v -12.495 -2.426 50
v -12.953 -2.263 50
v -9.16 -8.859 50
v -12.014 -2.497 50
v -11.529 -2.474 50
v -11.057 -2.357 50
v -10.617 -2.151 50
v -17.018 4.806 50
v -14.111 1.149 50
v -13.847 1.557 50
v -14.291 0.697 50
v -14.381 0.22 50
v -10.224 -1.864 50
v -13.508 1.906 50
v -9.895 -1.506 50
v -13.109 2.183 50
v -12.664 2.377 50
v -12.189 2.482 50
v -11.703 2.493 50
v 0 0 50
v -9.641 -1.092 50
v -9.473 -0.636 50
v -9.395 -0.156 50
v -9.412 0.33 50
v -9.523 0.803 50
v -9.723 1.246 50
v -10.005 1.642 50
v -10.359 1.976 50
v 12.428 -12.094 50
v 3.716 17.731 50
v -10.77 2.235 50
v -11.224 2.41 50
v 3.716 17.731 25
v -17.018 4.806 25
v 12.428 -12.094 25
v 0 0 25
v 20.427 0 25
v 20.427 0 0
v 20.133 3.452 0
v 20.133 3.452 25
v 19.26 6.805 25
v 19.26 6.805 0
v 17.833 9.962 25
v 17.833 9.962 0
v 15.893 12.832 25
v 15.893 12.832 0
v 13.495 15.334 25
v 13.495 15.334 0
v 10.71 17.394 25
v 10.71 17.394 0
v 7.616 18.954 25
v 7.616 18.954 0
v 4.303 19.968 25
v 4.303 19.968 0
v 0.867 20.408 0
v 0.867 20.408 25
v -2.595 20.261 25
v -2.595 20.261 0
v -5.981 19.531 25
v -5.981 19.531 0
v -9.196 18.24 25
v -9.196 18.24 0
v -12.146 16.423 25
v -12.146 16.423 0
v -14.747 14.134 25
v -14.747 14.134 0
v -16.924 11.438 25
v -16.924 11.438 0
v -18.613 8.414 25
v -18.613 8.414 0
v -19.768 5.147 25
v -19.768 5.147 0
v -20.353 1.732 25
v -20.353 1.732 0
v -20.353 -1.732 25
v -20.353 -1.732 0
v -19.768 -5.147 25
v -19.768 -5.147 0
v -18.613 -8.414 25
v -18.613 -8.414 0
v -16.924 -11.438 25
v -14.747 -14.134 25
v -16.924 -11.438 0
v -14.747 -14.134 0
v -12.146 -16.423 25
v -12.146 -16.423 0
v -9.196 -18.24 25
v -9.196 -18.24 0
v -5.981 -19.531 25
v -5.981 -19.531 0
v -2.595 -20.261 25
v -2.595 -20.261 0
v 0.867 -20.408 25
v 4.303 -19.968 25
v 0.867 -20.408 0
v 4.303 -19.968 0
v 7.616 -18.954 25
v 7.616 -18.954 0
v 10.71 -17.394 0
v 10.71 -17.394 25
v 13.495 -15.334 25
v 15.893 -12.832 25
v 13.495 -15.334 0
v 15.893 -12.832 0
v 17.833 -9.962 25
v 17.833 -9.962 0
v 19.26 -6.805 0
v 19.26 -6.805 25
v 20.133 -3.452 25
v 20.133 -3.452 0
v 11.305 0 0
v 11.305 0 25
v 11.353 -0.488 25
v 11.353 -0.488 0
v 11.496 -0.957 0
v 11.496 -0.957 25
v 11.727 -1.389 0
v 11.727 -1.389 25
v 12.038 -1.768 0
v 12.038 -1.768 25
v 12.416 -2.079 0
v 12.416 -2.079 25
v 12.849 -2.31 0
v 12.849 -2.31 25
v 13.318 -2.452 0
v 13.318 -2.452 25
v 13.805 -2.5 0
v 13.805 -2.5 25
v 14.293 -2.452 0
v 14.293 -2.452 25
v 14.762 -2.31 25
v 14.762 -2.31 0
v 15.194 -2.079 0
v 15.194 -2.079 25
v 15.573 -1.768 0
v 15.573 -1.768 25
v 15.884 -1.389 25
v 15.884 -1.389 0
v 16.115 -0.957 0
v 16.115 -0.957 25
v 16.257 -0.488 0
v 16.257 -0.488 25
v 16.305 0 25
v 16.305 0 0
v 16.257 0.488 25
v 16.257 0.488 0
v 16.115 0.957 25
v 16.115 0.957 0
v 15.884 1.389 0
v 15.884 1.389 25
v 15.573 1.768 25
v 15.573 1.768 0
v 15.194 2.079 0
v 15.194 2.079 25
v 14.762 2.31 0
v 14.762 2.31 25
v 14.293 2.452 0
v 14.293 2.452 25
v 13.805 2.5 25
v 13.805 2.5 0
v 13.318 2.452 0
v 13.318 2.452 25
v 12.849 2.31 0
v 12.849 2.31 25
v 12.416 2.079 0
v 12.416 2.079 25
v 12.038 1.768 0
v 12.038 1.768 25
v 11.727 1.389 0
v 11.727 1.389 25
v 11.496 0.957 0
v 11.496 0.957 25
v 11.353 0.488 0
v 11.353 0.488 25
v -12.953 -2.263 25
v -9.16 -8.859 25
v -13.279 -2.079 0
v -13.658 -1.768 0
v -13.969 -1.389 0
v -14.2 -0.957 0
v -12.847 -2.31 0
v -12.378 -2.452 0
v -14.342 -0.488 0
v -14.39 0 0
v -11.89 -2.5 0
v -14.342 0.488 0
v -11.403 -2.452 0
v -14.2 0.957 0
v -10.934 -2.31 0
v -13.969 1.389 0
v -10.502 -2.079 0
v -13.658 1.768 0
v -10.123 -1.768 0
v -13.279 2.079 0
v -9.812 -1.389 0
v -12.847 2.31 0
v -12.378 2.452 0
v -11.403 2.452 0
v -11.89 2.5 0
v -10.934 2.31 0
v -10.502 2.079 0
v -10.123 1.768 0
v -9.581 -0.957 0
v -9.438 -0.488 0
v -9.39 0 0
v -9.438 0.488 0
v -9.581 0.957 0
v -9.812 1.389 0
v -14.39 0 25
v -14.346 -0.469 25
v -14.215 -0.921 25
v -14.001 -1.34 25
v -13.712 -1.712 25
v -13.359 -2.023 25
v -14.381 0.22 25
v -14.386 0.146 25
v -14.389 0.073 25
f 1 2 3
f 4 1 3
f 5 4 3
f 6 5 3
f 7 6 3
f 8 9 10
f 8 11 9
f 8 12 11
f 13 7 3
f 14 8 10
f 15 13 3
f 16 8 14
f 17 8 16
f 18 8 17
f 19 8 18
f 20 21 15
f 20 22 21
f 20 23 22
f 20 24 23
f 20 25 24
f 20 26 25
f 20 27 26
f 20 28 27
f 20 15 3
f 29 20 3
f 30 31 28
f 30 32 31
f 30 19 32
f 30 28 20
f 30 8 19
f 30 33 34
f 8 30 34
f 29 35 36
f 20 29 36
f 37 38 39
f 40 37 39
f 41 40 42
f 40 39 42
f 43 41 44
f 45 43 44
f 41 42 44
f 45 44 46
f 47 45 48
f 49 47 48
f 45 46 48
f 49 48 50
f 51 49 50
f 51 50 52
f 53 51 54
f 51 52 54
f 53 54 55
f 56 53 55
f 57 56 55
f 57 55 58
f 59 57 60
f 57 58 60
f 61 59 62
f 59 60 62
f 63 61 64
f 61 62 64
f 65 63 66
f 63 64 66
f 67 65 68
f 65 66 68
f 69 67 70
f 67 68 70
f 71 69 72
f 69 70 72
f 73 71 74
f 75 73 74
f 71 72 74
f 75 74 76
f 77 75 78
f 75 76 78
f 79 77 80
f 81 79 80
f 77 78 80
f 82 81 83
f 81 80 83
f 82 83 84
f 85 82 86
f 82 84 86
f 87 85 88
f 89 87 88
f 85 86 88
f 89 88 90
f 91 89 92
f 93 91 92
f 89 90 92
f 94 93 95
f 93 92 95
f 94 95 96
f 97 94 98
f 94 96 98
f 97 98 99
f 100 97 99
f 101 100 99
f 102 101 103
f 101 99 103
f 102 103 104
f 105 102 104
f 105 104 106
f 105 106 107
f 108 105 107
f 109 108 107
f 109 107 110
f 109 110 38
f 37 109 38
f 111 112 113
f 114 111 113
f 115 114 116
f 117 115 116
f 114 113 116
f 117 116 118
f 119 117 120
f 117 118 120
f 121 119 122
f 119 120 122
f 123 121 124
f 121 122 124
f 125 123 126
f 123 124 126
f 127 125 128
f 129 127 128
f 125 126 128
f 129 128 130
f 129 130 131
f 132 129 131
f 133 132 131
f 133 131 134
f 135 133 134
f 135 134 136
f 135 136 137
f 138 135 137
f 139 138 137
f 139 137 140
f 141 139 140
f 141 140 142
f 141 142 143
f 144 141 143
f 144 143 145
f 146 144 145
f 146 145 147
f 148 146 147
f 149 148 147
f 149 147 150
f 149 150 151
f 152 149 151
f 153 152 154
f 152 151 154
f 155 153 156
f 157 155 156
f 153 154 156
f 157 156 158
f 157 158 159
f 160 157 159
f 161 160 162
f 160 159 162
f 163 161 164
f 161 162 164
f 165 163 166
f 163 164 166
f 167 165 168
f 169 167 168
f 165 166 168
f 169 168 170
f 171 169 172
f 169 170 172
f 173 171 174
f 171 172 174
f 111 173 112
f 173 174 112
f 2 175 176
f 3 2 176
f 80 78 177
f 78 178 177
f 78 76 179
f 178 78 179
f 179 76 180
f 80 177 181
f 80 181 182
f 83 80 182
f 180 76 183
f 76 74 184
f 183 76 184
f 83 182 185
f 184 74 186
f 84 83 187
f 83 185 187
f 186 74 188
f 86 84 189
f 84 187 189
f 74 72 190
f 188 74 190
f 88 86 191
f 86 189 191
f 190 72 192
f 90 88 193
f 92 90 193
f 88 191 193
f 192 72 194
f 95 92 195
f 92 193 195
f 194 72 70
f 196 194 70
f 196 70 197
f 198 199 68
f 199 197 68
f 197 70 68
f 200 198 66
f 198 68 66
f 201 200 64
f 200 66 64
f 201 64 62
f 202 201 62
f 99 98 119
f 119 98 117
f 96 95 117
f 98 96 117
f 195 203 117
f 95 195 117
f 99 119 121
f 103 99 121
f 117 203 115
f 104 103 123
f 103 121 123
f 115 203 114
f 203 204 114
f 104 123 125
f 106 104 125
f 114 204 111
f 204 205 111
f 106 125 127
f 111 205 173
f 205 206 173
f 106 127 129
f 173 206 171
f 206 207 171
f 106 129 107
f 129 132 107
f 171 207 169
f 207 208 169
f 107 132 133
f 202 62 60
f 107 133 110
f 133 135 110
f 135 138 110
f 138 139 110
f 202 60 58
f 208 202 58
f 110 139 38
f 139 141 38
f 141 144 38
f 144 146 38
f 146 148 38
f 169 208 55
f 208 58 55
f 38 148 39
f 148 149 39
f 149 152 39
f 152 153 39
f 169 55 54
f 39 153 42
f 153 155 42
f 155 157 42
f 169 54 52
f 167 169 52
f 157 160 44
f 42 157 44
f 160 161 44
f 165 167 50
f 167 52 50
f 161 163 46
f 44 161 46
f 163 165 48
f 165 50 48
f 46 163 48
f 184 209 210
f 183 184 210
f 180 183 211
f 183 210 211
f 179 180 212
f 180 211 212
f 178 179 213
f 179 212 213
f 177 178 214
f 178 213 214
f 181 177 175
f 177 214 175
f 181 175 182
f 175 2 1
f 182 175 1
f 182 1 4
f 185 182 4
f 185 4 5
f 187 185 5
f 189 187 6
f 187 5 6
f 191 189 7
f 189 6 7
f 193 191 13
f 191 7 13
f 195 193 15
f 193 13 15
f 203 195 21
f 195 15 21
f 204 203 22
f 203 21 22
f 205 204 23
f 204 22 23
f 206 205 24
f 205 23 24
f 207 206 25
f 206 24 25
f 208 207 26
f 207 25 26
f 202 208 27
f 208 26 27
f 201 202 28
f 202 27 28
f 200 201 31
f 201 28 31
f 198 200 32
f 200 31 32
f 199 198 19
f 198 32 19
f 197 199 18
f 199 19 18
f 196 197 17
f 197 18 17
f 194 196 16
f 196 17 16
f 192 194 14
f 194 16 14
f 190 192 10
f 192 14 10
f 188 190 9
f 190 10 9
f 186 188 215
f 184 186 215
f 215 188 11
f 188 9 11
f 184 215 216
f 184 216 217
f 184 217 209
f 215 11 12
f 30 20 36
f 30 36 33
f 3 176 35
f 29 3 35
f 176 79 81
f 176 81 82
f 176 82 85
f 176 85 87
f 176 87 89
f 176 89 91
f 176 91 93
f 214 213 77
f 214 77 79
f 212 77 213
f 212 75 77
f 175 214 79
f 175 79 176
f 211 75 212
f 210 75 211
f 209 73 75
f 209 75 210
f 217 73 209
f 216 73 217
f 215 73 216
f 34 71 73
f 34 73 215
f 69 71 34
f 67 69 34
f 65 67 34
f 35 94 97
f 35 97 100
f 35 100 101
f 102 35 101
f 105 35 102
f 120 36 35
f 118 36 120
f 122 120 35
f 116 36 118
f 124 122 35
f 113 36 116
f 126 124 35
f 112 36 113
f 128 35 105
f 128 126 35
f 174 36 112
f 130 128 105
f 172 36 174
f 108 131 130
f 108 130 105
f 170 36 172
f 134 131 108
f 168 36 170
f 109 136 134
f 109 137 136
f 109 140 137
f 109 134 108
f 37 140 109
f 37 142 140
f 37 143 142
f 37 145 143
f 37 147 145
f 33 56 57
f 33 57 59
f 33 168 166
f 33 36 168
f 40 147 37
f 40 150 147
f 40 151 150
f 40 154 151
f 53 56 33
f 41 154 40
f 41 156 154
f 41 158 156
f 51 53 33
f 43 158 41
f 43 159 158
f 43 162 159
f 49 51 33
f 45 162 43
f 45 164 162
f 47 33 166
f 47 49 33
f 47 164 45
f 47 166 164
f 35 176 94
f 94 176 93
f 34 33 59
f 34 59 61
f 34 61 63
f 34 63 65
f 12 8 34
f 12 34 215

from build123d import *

# Parameters (mm, degrees)
F0_R     = 20.426716
F1_DEPTH = 25
F3_DEPTH = 25
F5_D     = 5


with BuildPart() as f1:
    # F0 (on Top) → F1 (new body)
    with BuildSketch(Plane.XY):
        Circle(F0_R)
    extrude(amount=F1_DEPTH)

    # F2 (on face) → F3 (join)
    with BuildSketch(Plane.XY.offset(25)):
        Polygon((-9.159605, -8.859223), (12.427566, -12.093626), (0, 0), (3.715735, 17.731052), (-17.018216, 4.805511), align=None)
    extrude(amount=F3_DEPTH)

    # F5 (through all)
    with Locations(Plane(origin=(0, 0, 0), x_dir=(1, 0, 0), z_dir=(0, 0, -1))):
        with Locations((-11.890458, 0), (13.805311, 0)):
            Hole(F5_D / 2)


solid = f1.part
